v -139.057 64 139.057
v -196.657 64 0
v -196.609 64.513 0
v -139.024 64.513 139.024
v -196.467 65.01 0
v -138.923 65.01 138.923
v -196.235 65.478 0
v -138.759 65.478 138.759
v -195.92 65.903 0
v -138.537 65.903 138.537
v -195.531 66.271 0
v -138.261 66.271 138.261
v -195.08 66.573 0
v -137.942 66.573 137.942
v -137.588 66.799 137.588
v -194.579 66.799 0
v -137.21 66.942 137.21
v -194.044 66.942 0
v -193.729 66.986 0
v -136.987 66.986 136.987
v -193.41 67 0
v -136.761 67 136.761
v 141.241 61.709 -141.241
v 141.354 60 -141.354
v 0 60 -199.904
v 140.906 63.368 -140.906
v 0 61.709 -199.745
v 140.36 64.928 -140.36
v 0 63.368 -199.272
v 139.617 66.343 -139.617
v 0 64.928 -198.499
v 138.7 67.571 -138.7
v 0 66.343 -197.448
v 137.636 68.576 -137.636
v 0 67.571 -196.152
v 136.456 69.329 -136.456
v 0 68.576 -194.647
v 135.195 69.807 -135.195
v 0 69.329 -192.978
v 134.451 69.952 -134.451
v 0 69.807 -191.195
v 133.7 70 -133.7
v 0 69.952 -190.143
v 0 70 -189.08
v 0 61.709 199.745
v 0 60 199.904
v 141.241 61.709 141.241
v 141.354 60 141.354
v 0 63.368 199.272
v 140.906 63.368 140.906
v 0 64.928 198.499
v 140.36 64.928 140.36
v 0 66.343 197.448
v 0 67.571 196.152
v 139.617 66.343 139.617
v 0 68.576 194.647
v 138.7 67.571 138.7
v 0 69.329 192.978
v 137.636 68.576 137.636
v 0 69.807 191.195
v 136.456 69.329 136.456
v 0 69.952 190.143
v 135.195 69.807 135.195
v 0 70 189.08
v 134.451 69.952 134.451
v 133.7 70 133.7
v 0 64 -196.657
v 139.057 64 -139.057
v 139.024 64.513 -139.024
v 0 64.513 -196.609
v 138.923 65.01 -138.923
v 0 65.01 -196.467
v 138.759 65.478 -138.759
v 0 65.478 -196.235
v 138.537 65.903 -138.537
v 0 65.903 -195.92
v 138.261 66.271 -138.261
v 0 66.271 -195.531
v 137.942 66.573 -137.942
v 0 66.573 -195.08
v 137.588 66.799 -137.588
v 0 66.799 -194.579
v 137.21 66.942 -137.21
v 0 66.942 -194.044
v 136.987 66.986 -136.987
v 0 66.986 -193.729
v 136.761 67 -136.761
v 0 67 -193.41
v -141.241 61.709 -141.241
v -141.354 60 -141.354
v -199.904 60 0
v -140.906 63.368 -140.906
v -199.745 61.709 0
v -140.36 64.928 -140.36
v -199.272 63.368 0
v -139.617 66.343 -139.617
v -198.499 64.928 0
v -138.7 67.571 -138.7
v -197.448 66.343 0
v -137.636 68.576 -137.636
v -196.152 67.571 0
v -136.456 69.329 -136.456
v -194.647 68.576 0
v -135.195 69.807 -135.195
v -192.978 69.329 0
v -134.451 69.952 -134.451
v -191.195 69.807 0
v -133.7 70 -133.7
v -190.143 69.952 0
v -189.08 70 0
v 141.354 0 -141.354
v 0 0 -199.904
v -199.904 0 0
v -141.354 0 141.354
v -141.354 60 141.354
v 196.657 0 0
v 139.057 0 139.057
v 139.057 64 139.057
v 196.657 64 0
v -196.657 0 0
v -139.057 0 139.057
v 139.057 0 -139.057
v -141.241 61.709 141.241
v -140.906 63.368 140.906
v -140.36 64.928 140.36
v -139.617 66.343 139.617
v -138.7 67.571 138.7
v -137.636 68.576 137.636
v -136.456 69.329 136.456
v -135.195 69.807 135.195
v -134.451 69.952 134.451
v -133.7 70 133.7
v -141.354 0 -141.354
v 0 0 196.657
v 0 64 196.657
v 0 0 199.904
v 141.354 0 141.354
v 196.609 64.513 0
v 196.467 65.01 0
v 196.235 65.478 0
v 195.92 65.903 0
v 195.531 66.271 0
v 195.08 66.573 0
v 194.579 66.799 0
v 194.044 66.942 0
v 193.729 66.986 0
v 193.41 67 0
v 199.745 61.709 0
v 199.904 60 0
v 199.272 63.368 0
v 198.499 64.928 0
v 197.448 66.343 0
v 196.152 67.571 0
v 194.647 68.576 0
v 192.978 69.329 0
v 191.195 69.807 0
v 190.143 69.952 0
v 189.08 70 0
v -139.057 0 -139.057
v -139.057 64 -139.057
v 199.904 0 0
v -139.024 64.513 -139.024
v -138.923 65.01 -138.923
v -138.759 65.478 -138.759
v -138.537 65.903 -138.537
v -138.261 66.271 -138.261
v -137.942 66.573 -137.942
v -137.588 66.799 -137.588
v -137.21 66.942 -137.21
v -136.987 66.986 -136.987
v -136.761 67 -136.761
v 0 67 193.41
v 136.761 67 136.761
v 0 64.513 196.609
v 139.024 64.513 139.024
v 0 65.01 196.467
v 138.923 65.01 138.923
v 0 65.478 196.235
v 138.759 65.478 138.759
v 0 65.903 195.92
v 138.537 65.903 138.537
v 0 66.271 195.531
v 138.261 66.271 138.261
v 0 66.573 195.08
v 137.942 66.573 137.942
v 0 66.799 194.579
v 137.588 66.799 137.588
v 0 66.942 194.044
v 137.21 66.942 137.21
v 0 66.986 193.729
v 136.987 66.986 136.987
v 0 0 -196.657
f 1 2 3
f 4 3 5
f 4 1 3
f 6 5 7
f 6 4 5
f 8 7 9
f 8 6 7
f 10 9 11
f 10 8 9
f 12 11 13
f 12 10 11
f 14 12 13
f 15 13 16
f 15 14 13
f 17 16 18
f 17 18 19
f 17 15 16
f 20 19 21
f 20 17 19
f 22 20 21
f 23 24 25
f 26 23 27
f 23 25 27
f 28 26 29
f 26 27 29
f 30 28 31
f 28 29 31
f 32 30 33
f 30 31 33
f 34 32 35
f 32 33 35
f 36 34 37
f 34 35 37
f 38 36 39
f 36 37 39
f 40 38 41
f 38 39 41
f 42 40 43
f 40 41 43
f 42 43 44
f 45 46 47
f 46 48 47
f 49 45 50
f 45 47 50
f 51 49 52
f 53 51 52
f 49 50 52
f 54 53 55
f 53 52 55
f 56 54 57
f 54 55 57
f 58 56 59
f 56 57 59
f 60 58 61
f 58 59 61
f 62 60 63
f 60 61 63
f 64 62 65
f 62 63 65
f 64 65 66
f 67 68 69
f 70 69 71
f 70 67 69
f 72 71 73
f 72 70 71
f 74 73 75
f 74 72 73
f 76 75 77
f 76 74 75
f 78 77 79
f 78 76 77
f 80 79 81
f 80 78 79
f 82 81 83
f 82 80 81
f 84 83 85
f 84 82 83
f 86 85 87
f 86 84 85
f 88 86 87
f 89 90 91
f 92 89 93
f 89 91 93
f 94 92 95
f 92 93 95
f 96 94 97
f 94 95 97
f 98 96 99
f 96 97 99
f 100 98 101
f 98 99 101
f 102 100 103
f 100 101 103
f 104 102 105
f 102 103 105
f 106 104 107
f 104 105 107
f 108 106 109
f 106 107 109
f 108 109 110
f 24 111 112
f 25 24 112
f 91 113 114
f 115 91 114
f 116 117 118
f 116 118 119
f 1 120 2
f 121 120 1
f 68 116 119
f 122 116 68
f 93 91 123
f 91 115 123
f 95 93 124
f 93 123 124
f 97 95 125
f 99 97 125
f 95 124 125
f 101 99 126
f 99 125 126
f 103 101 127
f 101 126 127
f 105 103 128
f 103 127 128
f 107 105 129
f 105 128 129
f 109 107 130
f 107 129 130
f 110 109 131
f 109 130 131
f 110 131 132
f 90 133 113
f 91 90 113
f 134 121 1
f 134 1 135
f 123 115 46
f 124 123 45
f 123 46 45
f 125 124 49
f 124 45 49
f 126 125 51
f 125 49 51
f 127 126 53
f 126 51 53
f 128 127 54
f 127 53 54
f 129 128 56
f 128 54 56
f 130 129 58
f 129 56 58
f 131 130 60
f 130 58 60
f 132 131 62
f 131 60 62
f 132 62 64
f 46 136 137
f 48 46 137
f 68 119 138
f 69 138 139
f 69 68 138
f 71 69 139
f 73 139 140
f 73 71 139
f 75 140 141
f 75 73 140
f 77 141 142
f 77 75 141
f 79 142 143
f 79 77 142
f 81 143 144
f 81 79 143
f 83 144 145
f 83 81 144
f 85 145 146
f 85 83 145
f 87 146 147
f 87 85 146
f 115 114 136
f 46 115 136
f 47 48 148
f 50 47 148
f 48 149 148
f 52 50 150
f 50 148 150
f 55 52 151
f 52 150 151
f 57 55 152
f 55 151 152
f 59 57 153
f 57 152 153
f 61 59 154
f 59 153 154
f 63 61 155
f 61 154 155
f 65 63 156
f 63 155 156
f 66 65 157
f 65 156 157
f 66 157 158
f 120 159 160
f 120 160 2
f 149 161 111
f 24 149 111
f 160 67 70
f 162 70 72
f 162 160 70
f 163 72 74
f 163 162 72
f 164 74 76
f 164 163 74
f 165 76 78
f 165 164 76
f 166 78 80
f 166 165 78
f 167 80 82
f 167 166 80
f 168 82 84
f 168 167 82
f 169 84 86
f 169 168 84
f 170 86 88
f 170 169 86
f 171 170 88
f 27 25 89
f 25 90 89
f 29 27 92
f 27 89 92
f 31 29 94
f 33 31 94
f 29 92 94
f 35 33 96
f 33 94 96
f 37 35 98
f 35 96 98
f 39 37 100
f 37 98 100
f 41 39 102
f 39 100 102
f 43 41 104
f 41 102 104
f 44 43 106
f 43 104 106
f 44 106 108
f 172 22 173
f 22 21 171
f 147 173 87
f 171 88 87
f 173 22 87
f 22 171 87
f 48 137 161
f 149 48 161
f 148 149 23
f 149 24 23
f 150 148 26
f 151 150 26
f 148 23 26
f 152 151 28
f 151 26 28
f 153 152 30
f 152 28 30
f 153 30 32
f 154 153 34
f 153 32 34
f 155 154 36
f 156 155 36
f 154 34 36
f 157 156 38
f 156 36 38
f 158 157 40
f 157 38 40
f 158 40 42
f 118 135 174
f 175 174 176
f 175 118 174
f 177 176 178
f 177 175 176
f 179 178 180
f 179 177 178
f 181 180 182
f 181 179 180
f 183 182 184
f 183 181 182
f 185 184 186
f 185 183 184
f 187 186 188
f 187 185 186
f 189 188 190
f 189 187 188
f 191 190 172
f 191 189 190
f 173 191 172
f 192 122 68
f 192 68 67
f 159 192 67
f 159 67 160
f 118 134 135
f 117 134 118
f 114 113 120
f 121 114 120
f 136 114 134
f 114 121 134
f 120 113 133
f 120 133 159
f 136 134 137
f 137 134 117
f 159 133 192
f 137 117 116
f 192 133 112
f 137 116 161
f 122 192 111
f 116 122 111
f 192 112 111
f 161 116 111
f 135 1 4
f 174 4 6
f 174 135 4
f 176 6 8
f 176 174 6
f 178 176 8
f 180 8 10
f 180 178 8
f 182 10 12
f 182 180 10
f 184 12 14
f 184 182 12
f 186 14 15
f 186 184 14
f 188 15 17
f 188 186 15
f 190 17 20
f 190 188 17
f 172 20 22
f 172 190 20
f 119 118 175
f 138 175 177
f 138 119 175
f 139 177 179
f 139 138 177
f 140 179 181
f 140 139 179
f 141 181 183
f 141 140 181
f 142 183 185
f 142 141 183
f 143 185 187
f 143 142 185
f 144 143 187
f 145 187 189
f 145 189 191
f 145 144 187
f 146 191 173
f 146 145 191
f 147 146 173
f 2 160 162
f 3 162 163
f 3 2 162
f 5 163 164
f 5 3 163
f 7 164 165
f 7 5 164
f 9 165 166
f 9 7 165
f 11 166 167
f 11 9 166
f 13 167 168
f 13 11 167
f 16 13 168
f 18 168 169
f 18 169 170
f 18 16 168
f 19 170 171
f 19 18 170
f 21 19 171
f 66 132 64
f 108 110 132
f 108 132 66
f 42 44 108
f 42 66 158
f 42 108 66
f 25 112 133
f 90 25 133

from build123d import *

# Parameters (mm, degrees)
BOSS_EXTRUDE1_DEPTH = 70
SHELL1_T            = -3
SKETCH5_W           = 100
SKETCH5_H           = 80
CUT_EXTRUDE2_DEPTH  = 30
FILLET1_R           = 10
FILLET2_R           = 3


with BuildPart() as part:
    # Sketch3 → Boss-Extrude1 (new body)
    with BuildSketch(Plane(origin=(0, 0, 0), x_dir=(1, 0, 0), z_dir=(0, 1, 0))):
        Polygon((0, 199.904133626), (-141.353568474, 141.353568474), (-199.904133626, 0), (-141.353568474, -141.353568474), (0, -199.904133626), (141.353568474, -141.353568474), (199.904133626, 0), (141.353568474, 141.353568474), align=None)
    extrude(amount=BOSS_EXTRUDE1_DEPTH)

    # Shell1
    shell1_openings = [part.faces().sort_by_distance(p)[0] for p in [
        (0, 0, 0),
    ]]
    offset(amount=SHELL1_T, openings=shell1_openings, kind=Kind.INTERSECTION)

    # Sketch5 → Cut-Extrude2 (cut)
    with BuildSketch(Plane(origin=(331, 0, 0), x_dir=(0, 0, -1), z_dir=(1, 0, 0))):
        with Locations((0, 40)):
            Rectangle(SKETCH5_W, SKETCH5_H)
    extrude(amount=-CUT_EXTRUDE2_DEPTH, mode=Mode.SUBTRACT)

    # Fillet1
    fillet1_edges = [part.edges().sort_by_distance(p)[0] for p in [
        (170.62885105, 70, -70.676784237),
        (70.676784237, 70, -170.62885105),
        (-70.676784237, 70, -170.62885105),
        (-170.62885105, 70, -70.676784237),
        (-170.62885105, 70, 70.676784237),
        (-70.676784237, 70, 170.62885105),
        (70.676784237, 70, 170.62885105),
        (170.62885105, 70, 70.676784237),
    ]]
    fillet(fillet1_edges, radius=FILLET1_R)

    # Fillet2
    fillet2_edges = [part.edges().sort_by_distance(p)[0] for p in [
        (69.52873394, 67, 167.857212453),
        (167.857212453, 67, 69.52873394),
        (167.857212453, 67, -69.52873394),
        (69.52873394, 67, -167.857212453),
        (-69.52873394, 67, -167.857212453),
        (-167.857212453, 67, -69.52873394),
        (-167.857212453, 67, 69.52873394),
        (-69.52873394, 67, 167.857212453),
    ]]
    fillet(fillet2_edges, radius=FILLET2_R)


solid = part.part
